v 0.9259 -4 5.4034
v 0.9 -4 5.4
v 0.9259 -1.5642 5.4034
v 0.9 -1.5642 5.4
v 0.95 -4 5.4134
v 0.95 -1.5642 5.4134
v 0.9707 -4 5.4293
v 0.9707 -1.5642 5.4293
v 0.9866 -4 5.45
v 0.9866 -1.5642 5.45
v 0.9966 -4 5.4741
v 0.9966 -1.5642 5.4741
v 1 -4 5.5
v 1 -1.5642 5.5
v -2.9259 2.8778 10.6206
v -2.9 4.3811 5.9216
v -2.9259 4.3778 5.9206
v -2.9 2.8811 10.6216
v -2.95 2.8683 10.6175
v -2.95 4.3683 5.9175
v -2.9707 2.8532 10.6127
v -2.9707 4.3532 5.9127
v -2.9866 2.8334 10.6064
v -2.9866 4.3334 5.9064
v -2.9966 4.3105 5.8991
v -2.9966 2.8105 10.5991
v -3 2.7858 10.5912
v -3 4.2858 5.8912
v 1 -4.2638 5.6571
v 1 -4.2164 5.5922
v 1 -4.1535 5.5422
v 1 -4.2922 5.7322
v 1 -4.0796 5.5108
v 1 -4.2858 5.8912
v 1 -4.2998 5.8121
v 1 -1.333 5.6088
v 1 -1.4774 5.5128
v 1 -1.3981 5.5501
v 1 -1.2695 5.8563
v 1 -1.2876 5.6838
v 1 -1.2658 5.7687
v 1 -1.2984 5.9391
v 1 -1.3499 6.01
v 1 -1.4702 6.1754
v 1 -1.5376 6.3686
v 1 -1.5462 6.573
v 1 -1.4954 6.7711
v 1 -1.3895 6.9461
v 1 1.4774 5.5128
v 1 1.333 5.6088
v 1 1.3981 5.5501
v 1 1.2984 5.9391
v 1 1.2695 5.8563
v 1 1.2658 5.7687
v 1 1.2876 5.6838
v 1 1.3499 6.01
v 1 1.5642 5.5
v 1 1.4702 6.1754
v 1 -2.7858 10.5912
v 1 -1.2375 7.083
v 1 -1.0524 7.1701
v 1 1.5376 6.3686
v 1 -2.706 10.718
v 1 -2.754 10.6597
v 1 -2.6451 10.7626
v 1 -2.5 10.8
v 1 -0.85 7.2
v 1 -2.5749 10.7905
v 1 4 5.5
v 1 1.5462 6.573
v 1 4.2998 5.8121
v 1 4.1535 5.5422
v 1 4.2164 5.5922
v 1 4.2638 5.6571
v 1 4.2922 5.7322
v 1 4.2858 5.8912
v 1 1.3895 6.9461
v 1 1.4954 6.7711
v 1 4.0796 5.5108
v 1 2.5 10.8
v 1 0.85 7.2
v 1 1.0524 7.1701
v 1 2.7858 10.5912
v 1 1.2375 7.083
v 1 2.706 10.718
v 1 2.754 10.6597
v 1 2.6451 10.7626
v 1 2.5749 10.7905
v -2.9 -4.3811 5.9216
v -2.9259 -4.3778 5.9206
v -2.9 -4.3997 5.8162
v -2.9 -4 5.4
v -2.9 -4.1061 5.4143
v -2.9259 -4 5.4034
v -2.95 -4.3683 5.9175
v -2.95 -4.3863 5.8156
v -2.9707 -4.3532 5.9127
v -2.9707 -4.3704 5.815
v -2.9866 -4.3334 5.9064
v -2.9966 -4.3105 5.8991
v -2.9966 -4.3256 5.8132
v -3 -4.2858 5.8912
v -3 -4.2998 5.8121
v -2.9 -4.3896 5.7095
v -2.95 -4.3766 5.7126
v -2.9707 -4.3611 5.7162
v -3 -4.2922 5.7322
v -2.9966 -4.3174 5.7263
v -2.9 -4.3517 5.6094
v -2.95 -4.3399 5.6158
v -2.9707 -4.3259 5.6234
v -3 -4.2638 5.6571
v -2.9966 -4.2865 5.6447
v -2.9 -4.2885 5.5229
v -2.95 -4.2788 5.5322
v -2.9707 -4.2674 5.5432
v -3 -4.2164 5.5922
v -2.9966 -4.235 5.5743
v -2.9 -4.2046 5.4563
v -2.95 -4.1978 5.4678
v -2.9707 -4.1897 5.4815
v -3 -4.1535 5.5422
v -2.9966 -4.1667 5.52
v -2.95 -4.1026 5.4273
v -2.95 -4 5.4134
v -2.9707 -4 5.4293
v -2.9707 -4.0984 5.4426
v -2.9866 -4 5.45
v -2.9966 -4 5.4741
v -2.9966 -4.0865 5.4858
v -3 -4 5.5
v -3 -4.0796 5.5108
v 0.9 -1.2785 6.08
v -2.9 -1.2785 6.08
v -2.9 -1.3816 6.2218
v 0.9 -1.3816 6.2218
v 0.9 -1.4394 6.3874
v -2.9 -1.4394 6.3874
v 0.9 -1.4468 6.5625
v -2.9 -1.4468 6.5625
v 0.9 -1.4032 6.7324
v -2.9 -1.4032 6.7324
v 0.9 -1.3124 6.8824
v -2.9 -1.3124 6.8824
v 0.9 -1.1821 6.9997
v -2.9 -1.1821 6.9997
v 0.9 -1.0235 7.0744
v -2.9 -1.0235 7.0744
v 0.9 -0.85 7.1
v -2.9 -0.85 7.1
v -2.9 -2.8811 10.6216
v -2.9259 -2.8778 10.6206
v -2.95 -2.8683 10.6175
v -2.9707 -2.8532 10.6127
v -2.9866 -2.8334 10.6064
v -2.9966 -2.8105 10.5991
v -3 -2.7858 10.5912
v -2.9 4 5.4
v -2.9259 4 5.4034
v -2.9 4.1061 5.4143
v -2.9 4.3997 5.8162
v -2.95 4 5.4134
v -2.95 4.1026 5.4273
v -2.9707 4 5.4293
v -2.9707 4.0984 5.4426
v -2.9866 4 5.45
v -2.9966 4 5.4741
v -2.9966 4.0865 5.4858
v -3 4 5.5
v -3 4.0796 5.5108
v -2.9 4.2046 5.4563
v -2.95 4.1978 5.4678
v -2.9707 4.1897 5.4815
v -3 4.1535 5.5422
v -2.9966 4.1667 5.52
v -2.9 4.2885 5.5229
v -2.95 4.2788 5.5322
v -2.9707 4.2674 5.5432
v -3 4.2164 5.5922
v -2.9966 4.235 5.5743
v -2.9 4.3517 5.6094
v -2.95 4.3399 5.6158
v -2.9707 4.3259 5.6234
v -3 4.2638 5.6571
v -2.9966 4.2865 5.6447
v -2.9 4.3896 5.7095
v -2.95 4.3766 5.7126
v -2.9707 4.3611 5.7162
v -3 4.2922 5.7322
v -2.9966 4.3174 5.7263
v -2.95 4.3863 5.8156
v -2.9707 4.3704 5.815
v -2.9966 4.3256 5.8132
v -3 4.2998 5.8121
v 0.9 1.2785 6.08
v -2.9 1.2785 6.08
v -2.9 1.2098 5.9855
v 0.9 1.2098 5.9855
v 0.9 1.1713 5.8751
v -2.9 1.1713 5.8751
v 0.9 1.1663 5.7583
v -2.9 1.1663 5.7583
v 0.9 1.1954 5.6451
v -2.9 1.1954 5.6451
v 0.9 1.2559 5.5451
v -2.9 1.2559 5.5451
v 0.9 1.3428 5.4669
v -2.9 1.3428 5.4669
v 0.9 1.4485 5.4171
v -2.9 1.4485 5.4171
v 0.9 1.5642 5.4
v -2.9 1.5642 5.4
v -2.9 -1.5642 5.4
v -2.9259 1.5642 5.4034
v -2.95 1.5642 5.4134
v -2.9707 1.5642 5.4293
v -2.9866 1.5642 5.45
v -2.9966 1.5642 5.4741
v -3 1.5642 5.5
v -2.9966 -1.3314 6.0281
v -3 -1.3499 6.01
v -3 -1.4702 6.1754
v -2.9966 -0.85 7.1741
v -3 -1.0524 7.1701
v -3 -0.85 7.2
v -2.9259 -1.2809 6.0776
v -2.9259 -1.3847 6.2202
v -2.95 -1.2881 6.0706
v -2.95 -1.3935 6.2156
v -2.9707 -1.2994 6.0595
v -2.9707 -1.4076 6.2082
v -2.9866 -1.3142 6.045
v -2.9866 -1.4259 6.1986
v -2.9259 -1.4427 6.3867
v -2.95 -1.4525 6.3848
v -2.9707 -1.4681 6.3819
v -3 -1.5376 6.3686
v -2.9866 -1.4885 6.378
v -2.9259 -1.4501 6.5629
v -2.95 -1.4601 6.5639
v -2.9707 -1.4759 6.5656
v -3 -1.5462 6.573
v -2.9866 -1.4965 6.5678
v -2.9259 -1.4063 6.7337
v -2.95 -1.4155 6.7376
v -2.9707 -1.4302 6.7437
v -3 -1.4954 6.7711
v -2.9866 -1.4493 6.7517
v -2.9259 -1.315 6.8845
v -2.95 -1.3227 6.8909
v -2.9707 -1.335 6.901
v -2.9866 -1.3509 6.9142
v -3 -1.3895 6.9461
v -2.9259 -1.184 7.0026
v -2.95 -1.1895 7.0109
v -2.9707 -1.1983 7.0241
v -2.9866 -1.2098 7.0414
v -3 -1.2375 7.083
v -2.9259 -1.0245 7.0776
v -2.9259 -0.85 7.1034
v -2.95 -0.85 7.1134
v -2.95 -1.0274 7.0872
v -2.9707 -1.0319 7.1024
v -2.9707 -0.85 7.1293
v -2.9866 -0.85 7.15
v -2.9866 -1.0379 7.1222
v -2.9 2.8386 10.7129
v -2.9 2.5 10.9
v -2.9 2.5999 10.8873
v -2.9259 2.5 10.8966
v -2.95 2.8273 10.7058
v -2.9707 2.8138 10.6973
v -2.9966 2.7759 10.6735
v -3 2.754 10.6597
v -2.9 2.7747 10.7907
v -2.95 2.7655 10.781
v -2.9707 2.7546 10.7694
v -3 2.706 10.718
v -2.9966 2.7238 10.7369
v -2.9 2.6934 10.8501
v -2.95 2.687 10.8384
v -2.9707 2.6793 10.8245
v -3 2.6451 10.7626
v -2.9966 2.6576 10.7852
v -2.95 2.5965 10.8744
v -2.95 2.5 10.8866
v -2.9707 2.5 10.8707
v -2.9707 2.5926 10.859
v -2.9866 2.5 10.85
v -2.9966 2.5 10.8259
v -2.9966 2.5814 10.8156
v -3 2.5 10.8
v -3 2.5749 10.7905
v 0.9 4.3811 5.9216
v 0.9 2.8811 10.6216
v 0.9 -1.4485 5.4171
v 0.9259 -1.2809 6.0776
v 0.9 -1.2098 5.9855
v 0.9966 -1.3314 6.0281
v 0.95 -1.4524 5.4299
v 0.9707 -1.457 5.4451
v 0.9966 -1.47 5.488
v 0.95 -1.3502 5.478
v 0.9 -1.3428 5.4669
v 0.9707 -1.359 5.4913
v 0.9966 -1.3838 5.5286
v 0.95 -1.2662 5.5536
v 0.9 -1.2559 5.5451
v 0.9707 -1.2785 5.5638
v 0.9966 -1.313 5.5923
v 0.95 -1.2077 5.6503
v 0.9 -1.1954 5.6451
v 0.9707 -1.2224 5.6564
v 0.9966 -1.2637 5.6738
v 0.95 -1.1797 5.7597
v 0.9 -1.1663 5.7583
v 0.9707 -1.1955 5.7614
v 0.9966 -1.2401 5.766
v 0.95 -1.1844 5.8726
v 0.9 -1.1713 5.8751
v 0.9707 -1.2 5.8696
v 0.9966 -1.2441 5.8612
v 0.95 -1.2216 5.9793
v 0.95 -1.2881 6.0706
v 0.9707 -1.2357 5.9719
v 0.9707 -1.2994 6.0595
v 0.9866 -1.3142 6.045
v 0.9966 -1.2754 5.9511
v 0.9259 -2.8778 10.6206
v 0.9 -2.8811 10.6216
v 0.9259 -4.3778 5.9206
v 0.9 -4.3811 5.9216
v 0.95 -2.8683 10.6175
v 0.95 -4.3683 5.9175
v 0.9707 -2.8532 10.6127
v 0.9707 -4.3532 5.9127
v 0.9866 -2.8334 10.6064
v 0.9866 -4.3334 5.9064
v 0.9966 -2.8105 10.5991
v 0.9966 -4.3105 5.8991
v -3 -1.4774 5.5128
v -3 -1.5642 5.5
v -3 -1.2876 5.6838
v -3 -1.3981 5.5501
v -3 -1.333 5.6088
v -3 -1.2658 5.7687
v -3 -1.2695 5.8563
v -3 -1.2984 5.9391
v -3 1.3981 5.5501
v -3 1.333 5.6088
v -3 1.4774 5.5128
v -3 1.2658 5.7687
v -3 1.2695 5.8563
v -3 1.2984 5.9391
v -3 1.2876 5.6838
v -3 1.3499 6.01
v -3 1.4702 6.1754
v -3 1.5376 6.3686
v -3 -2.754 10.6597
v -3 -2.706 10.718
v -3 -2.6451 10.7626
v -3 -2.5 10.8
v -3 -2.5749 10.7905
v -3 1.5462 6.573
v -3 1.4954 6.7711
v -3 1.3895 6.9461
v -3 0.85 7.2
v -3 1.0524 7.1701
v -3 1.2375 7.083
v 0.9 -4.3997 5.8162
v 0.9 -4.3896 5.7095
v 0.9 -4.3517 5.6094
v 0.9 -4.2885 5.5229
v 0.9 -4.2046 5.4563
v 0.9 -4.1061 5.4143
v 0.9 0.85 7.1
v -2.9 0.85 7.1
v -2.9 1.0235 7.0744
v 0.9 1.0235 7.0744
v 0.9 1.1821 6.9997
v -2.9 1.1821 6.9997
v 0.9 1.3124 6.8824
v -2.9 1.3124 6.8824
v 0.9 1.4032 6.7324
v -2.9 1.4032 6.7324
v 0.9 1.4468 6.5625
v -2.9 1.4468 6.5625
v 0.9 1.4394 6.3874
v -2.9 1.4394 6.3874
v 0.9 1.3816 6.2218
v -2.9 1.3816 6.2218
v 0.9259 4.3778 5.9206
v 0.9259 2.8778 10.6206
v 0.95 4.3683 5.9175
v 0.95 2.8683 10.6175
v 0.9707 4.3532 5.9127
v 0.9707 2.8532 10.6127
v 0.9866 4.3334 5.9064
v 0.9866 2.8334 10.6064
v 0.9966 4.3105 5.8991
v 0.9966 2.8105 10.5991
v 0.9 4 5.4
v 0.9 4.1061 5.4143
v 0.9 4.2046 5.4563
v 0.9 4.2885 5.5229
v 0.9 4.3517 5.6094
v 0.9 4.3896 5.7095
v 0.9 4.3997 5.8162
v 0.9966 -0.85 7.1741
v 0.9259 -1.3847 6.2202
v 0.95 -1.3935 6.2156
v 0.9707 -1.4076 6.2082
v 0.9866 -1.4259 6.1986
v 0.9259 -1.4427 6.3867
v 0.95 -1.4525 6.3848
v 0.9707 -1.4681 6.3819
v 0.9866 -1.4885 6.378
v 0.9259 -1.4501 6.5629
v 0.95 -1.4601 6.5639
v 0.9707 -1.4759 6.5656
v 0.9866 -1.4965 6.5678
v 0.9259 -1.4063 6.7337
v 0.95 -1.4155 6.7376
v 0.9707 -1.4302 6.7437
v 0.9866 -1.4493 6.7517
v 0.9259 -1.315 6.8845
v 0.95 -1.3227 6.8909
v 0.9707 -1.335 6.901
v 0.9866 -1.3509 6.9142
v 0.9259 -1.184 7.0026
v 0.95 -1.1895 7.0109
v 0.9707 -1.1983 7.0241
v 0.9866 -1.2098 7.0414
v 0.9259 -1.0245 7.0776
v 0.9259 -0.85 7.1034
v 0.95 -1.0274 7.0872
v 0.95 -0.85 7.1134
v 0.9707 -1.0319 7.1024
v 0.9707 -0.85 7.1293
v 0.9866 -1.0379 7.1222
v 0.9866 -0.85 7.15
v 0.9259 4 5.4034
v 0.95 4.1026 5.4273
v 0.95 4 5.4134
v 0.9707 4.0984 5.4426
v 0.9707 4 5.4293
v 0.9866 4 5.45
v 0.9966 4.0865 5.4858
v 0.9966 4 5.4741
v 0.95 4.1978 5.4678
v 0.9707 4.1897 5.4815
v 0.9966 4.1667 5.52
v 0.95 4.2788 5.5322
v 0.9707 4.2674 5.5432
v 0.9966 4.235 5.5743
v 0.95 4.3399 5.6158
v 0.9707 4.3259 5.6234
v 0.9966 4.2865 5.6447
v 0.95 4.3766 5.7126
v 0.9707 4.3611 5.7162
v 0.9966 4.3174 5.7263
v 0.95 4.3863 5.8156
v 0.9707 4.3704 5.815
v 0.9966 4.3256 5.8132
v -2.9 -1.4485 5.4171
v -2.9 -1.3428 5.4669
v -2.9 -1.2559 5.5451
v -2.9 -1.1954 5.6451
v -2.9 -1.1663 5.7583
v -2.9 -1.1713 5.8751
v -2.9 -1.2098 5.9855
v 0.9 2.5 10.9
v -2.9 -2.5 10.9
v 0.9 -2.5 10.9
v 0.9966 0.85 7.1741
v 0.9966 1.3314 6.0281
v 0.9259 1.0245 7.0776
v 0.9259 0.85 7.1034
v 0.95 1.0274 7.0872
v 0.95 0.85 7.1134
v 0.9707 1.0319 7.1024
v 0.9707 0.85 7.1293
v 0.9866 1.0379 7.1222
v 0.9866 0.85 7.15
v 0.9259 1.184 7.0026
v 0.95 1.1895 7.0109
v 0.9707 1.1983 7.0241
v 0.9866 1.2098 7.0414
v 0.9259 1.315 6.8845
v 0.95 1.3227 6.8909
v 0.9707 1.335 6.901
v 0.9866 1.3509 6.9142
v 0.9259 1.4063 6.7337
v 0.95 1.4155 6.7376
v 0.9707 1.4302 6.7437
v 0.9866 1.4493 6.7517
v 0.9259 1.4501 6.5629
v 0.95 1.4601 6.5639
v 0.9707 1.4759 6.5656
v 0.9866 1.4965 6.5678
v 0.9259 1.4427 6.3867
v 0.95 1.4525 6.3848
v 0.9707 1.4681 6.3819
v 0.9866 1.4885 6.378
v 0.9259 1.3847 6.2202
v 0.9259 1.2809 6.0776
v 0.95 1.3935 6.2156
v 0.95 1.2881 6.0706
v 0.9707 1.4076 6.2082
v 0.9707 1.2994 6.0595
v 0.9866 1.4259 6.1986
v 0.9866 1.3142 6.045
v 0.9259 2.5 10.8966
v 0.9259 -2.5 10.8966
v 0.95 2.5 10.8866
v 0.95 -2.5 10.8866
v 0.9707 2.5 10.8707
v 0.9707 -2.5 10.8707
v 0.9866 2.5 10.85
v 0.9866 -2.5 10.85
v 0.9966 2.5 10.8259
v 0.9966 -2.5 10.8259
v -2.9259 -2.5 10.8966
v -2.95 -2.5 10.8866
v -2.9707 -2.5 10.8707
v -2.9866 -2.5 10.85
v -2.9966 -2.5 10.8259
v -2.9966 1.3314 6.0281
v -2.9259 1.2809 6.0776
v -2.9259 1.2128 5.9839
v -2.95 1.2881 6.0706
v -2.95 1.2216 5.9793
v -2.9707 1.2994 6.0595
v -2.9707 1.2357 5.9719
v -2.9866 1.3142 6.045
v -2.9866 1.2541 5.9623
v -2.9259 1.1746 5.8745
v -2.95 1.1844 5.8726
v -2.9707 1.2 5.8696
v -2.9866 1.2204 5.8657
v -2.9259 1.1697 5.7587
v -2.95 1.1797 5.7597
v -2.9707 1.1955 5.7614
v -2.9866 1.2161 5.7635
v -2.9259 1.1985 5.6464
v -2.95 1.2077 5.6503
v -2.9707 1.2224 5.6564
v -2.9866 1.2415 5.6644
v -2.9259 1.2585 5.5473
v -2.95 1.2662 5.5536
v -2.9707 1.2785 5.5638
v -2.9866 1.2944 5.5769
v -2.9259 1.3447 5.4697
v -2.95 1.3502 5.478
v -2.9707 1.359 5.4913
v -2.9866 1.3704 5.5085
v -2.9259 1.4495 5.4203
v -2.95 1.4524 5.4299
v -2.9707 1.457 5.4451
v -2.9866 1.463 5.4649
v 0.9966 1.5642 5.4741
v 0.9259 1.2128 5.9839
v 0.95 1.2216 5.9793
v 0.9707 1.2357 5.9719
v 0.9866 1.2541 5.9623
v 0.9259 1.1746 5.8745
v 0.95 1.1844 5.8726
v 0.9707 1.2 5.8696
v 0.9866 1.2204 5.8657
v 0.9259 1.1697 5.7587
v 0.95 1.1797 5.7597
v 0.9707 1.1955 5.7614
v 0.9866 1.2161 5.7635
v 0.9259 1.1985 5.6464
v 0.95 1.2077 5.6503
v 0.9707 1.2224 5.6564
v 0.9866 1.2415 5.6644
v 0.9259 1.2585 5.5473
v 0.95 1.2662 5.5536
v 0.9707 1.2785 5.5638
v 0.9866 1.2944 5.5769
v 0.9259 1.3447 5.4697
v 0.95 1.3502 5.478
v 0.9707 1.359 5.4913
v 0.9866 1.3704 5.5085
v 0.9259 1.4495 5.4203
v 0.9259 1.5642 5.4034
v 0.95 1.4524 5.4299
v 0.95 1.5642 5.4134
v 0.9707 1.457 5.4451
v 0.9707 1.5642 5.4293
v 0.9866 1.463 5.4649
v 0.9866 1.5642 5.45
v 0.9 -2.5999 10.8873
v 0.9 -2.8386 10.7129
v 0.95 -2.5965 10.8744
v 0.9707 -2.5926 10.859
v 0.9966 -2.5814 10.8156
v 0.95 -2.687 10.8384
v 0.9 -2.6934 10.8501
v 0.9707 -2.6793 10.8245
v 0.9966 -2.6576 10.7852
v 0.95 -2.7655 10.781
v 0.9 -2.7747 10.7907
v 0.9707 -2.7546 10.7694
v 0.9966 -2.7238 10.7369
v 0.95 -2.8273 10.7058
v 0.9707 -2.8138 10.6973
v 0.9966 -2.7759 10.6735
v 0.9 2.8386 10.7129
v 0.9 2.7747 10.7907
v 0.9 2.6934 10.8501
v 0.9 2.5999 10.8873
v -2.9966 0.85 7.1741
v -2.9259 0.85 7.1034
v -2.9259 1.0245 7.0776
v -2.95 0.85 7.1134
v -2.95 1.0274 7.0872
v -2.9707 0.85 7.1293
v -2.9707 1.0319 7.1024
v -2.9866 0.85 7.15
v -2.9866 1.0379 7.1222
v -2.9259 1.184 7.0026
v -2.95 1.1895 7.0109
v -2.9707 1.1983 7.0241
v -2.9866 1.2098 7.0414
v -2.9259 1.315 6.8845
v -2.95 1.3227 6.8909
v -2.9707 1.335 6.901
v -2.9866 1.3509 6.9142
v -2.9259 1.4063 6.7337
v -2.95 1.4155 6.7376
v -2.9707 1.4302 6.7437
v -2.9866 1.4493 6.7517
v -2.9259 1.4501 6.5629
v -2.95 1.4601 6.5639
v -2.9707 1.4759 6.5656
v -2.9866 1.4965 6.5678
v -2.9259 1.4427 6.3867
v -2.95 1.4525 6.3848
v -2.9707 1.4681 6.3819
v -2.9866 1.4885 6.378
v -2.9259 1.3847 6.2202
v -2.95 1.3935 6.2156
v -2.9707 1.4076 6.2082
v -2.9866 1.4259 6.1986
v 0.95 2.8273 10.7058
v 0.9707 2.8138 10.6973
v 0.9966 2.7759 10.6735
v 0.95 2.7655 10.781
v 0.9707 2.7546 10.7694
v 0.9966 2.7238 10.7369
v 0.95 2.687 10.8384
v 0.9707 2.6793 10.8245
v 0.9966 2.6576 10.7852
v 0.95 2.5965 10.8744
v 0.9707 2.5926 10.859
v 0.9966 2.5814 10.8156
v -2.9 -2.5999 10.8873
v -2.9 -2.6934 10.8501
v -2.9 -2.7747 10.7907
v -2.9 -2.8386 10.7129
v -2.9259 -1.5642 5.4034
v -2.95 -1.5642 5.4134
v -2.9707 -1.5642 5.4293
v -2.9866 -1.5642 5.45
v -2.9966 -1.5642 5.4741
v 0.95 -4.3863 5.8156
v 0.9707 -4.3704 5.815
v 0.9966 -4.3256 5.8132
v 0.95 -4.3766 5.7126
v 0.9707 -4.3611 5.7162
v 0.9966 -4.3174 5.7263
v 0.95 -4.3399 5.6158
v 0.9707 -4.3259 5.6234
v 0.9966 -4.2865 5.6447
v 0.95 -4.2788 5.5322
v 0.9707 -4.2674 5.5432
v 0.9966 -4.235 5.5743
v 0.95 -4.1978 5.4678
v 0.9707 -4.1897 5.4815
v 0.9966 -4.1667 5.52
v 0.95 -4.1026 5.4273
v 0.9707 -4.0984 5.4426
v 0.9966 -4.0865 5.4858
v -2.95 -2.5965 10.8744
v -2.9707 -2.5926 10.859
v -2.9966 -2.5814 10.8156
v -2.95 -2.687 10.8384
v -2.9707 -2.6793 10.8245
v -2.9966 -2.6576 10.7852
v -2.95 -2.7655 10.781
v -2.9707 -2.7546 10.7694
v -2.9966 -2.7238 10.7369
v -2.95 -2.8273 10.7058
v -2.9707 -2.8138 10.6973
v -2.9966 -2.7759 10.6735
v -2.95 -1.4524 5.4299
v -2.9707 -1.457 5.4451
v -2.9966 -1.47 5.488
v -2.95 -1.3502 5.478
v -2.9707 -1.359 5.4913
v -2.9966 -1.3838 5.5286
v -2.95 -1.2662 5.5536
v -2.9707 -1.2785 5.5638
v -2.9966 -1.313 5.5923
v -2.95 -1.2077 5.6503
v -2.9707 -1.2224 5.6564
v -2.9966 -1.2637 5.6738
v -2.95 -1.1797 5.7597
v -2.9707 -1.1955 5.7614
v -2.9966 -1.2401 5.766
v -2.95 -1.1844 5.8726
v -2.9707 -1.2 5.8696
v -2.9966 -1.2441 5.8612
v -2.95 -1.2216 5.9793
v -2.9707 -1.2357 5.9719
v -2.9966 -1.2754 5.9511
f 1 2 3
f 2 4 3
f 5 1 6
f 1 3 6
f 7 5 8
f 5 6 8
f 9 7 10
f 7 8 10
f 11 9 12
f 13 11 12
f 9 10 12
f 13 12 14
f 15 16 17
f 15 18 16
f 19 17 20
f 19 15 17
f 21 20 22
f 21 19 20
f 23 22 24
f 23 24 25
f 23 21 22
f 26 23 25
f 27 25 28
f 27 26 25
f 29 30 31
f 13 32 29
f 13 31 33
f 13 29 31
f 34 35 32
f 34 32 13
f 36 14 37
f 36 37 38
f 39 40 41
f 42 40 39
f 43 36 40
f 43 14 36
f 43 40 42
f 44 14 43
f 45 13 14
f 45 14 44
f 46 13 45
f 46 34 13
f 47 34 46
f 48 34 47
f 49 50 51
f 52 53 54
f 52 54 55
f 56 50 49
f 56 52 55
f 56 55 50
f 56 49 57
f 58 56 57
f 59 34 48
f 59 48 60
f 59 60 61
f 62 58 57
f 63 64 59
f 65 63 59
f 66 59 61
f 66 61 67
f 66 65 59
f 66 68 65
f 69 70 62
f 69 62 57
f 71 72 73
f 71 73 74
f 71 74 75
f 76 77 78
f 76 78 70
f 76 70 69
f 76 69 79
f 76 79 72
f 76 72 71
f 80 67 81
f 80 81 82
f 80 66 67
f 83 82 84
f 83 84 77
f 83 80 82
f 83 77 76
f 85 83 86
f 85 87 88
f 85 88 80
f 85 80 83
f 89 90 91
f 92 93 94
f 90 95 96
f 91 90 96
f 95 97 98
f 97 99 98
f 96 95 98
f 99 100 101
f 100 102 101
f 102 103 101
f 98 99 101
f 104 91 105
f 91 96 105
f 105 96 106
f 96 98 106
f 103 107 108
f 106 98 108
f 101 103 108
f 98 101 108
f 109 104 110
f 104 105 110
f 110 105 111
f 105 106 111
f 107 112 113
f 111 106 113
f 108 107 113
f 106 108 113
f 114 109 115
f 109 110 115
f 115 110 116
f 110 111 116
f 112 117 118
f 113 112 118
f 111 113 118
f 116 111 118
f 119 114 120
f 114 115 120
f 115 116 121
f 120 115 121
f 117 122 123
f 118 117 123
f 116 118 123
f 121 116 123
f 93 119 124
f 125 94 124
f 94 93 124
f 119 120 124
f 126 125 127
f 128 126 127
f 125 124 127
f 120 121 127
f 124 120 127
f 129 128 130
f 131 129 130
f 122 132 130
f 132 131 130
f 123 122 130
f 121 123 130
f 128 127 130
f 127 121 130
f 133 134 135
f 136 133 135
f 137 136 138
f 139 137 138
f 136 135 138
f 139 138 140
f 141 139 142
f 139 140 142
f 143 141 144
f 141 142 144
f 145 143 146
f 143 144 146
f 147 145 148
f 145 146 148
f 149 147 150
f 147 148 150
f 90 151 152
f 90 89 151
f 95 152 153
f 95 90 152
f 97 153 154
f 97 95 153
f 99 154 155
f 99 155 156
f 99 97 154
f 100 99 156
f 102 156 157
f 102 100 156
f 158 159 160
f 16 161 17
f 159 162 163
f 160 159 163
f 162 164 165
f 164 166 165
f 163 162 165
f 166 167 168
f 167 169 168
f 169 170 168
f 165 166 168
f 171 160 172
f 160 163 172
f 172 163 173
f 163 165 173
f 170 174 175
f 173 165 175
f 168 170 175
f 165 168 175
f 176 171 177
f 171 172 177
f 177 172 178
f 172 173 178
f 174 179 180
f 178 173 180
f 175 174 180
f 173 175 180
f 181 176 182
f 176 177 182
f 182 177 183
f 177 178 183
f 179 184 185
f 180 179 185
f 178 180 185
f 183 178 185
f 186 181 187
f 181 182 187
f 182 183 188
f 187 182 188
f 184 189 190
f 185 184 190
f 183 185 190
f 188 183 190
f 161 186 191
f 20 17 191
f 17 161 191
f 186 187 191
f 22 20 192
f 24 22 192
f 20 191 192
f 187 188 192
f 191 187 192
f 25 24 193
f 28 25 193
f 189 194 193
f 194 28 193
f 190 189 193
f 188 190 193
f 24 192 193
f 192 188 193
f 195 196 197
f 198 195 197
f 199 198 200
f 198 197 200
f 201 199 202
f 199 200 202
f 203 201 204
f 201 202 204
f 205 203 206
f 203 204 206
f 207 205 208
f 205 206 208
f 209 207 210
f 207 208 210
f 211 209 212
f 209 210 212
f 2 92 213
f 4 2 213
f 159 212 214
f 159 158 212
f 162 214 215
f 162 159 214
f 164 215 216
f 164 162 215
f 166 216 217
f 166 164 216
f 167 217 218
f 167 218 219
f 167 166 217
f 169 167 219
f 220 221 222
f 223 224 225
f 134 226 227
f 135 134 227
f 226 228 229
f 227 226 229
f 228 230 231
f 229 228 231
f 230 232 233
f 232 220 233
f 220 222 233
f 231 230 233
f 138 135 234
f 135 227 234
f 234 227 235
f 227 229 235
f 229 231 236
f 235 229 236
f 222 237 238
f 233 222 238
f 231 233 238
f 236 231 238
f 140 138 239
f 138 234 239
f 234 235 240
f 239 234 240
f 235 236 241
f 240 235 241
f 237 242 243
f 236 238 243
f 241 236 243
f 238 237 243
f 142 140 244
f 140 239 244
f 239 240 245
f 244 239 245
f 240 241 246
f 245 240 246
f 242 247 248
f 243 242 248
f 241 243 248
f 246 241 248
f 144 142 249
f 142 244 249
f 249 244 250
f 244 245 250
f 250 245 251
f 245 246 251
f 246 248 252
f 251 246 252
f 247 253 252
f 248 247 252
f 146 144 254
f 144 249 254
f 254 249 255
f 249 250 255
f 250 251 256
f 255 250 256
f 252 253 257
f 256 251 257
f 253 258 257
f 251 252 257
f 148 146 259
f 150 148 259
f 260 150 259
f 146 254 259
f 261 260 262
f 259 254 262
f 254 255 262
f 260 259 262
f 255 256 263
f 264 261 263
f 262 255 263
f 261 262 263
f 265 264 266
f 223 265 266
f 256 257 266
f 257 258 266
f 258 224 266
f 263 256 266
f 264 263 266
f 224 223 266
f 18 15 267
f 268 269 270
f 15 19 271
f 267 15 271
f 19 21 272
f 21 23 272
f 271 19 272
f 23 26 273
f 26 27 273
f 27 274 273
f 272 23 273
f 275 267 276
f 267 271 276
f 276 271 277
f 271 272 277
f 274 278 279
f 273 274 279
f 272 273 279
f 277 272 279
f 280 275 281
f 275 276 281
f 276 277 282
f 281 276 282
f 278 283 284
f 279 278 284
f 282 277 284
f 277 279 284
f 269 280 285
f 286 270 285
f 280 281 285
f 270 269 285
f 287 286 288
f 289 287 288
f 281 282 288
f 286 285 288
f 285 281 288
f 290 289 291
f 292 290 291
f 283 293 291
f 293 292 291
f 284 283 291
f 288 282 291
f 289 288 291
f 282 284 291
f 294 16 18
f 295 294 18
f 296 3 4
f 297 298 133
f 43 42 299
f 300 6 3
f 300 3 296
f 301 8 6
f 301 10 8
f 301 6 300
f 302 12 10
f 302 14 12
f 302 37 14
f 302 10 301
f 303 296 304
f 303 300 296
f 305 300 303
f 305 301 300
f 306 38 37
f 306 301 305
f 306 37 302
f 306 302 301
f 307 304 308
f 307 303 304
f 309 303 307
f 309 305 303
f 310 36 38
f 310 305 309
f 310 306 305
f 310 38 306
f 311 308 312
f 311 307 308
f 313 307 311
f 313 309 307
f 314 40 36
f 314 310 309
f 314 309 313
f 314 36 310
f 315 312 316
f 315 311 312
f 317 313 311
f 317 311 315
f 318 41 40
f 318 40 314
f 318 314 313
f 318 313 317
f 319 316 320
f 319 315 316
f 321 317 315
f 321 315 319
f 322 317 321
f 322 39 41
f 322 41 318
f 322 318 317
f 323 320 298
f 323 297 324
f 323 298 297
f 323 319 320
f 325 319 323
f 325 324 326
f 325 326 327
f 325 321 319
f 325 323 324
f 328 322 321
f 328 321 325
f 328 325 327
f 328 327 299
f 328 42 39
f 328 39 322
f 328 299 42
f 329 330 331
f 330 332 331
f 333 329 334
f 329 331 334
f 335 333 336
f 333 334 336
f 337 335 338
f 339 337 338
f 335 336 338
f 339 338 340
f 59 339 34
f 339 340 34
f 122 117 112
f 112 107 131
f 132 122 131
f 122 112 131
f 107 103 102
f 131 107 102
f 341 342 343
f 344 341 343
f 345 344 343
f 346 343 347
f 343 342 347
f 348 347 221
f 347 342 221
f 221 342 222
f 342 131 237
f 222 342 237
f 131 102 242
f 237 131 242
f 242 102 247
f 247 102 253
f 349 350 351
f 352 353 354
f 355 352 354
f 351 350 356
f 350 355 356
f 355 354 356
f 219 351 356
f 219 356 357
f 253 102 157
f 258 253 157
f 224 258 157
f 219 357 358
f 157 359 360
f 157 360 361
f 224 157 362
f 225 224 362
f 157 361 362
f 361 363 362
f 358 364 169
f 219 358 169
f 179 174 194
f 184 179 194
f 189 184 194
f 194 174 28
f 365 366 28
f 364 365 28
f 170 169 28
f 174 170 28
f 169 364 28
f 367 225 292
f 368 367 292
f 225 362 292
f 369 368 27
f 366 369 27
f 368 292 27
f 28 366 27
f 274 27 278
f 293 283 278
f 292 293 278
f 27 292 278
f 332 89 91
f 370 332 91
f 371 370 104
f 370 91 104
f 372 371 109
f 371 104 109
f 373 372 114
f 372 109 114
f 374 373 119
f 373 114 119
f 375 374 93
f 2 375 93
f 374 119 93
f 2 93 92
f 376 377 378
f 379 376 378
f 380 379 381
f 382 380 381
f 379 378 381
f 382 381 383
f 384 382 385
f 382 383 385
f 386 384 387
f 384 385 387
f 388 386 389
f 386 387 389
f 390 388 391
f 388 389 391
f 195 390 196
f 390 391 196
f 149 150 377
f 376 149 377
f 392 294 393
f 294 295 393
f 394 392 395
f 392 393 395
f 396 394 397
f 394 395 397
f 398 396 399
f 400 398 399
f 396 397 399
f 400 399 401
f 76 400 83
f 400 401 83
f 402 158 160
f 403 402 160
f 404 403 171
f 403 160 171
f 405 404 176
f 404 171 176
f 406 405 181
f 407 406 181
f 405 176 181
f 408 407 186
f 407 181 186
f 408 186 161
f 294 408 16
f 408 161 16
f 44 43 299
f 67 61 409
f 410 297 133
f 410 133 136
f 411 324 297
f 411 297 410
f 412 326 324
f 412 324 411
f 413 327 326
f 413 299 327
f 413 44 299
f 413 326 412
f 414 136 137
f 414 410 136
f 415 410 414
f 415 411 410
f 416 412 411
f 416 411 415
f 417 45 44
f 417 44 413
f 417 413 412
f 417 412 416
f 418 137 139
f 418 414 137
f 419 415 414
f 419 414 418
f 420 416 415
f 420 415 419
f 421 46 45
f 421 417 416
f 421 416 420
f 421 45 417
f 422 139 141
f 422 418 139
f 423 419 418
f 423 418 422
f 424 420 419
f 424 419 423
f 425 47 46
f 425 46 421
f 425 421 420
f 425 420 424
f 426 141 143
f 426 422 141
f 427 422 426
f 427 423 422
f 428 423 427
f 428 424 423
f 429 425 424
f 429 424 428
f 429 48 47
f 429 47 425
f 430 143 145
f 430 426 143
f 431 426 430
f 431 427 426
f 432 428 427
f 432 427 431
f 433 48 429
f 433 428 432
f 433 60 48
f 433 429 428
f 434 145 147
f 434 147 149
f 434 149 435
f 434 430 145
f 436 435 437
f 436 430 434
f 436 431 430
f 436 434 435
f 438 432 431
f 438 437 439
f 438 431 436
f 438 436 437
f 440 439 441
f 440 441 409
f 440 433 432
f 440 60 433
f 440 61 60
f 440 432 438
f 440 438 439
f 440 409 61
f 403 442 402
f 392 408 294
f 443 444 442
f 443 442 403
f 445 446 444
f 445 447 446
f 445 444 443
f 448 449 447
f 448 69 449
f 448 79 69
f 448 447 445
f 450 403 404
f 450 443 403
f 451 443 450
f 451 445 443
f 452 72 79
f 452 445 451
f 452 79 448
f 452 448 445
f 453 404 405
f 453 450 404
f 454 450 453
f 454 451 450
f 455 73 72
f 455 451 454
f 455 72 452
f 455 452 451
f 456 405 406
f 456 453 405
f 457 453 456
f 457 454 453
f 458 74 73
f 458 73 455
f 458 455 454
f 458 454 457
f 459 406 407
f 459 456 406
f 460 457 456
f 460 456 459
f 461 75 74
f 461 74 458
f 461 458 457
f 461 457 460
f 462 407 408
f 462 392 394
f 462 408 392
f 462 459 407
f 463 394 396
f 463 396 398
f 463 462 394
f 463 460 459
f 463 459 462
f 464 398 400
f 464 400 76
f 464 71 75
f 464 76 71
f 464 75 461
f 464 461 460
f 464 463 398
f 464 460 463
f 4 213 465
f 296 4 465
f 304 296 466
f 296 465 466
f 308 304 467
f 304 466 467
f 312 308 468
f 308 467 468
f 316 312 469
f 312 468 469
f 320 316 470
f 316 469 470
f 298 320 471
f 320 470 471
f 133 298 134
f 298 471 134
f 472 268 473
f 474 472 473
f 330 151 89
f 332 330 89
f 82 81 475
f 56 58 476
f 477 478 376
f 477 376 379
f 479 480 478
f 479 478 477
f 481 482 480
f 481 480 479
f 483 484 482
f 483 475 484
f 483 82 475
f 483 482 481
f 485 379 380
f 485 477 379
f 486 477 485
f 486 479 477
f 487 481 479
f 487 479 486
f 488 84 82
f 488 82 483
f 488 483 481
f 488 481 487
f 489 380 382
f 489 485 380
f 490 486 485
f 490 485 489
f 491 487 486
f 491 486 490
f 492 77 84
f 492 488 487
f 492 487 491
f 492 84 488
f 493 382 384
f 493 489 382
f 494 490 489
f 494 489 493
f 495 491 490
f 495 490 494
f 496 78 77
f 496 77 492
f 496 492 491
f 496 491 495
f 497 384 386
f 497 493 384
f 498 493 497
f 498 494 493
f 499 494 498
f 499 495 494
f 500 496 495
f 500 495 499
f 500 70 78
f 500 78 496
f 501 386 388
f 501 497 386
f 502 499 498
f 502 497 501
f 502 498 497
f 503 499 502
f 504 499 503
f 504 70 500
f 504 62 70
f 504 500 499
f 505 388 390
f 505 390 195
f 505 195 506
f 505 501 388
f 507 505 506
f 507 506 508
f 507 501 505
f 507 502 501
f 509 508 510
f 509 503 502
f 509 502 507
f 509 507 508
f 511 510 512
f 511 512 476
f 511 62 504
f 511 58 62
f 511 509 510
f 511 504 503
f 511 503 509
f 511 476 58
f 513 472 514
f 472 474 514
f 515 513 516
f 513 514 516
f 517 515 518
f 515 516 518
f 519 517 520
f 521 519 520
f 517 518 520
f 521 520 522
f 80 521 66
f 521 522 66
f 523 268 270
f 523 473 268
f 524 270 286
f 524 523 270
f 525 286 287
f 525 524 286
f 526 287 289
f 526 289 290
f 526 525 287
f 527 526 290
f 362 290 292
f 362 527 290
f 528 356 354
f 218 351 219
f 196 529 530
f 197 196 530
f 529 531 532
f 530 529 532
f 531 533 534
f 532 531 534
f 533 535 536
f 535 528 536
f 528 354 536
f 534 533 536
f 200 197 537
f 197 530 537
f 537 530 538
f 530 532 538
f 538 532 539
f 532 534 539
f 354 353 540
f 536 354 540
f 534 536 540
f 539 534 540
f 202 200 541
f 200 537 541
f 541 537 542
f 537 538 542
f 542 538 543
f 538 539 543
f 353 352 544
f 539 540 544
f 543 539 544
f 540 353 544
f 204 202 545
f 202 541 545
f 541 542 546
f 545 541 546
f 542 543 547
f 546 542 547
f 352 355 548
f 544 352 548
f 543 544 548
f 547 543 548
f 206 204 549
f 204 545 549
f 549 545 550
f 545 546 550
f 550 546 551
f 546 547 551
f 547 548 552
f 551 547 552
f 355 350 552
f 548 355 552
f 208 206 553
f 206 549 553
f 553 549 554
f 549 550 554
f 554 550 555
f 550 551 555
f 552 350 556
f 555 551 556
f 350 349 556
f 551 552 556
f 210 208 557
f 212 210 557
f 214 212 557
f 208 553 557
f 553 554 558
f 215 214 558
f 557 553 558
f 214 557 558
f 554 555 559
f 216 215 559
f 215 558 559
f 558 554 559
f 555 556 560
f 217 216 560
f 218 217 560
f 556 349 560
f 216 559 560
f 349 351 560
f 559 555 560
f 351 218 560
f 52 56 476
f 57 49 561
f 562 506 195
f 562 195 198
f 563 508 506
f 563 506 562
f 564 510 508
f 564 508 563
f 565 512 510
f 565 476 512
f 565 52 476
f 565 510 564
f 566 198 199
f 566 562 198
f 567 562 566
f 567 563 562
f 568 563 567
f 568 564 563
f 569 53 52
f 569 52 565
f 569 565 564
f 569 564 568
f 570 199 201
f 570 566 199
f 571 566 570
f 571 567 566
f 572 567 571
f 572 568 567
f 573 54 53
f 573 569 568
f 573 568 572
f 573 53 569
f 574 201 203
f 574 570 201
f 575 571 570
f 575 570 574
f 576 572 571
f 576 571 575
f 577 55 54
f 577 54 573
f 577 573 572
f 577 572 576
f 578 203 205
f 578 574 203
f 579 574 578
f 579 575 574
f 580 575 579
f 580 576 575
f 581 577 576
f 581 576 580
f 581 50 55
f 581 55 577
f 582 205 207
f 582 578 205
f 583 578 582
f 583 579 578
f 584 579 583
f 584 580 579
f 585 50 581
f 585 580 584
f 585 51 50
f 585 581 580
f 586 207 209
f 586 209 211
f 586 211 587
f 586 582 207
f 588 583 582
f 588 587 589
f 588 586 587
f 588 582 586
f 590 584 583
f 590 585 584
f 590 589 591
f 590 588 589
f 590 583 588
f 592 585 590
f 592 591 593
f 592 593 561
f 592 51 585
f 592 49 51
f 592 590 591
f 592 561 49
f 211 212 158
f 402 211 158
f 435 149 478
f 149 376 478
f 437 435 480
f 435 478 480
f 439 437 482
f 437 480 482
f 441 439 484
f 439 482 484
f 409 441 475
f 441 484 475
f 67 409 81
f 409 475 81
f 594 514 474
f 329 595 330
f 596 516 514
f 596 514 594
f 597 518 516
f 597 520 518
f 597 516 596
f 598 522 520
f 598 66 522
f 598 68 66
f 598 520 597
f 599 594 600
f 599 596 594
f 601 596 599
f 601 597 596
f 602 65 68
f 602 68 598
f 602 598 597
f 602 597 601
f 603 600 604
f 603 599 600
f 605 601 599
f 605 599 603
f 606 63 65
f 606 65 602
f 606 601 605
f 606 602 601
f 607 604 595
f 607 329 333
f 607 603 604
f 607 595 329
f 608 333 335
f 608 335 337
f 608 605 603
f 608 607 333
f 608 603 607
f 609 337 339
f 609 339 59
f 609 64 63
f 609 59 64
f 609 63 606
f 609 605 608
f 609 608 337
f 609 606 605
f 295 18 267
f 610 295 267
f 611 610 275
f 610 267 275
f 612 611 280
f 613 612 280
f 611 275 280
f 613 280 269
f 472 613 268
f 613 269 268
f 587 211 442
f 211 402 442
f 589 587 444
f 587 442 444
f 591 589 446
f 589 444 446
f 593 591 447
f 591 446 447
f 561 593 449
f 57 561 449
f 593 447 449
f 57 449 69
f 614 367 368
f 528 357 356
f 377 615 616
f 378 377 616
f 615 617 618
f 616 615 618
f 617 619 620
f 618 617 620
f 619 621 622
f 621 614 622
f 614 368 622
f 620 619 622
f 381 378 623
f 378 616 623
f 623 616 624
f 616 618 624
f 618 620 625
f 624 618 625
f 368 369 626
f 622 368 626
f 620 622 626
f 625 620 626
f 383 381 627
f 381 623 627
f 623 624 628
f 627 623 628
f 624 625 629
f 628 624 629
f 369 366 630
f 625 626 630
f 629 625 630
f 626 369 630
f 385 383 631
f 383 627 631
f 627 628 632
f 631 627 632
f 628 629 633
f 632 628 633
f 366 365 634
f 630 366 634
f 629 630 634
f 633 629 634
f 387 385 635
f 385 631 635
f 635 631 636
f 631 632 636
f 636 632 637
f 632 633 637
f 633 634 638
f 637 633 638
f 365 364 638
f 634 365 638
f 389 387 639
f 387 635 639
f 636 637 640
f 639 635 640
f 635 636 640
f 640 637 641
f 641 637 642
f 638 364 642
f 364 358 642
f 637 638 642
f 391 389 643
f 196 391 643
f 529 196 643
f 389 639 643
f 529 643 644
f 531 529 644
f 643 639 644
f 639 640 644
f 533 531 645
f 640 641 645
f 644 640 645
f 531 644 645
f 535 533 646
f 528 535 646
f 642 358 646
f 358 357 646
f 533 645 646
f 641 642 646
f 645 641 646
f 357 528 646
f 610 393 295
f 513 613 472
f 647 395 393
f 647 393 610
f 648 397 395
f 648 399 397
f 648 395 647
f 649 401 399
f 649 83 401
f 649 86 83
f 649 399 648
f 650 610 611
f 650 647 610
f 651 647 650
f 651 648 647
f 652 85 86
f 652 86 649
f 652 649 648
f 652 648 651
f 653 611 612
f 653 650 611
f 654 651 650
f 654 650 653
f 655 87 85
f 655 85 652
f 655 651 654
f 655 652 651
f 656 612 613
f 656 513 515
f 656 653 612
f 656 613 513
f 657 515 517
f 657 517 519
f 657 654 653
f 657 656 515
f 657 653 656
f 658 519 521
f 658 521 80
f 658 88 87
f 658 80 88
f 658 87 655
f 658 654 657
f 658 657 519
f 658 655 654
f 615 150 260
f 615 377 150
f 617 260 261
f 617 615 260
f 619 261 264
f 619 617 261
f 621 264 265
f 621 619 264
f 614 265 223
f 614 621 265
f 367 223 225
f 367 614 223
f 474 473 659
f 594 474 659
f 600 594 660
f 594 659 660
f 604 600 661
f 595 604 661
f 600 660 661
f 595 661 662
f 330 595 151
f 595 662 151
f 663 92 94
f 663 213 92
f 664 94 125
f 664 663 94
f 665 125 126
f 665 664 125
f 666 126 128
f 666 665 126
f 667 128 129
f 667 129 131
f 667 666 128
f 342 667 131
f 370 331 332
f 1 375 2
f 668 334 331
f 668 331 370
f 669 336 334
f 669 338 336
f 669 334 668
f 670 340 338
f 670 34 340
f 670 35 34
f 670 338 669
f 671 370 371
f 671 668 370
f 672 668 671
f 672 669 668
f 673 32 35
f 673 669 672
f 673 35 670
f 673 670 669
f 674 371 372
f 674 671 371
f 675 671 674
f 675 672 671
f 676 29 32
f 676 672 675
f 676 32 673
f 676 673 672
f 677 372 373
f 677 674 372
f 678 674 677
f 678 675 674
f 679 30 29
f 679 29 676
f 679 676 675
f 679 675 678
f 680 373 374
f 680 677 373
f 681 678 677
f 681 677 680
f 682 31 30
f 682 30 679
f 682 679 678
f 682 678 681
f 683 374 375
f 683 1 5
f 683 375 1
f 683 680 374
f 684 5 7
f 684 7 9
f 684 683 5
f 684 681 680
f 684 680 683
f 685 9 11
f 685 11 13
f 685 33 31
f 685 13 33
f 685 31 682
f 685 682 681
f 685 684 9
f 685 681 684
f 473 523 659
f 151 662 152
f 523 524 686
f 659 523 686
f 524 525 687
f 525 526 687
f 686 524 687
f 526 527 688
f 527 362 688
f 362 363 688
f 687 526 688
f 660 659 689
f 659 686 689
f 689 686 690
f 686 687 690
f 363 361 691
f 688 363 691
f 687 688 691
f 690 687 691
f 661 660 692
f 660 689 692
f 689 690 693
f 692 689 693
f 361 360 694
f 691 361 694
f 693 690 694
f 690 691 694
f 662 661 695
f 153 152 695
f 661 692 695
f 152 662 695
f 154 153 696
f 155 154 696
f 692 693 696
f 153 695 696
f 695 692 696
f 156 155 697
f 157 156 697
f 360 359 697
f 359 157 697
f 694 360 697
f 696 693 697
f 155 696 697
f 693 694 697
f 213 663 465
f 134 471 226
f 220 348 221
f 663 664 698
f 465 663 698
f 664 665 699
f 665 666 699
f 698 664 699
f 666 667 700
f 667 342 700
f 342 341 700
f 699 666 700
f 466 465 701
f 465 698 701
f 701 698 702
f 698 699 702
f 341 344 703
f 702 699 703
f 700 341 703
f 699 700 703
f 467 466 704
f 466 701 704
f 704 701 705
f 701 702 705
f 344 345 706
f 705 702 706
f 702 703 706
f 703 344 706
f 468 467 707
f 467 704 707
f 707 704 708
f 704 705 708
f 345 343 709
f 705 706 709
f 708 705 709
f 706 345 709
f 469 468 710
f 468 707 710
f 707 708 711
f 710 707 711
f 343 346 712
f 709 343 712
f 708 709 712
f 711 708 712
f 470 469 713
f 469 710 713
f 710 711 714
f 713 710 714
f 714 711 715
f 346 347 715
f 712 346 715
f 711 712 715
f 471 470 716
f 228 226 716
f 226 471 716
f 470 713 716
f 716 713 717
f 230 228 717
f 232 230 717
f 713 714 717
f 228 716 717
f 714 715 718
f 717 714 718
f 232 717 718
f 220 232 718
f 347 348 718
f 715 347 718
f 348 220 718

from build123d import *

# Parameters (mm, degrees)
BOSS_EXTRUDE1_DEPTH      = 1
BOSS_EXTRUDE1_DEPTH_BACK = 3
FILLET1_R                = 0.1


with BuildPart() as part:
    # Sketch3 → Boss-Extrude1 (new, two sides: drawn at the far end of the back side and taken through both)
    with BuildSketch(Plane.YZ.offset(-BOSS_EXTRUDE1_DEPTH_BACK)):
        with BuildLine():
            Line((-4, 5.4), (-1.56416825, 5.4))
            ThreePointArc((-1.56416825, 5.4), (-1.195386471, 5.645080666), (-1.278511113, 6.08))
            ThreePointArc((-1.278511113, 6.08), (-1.403198074, 6.732379001), (-0.850025407, 7.1))
            Line((-0.850025407, 7.1), (0.850025407, 7.1))
            ThreePointArc((0.850025407, 7.1), (1.403198074, 6.732379001), (1.278511113, 6.08))
            ThreePointArc((1.278511113, 6.08), (1.195386471, 5.645080666), (1.56416825, 5.4))
            Line((1.56416825, 5.4), (4, 5.4))
            ThreePointArc((4, 5.4), (4.322991043, 5.564040711), (4.381063684, 5.92161607))
            Line((4.381063684, 5.92161607), (2.881063684, 10.62161607))
            ThreePointArc((2.881063684, 10.62161607), (2.735959289, 10.822991043), (2.5, 10.9))
            Line((2.5, 10.9), (-2.5, 10.9))
            ThreePointArc((-2.5, 10.9), (-2.735959289, 10.822991043), (-2.881063684, 10.62161607))
            Line((-2.881063684, 10.62161607), (-4.381063684, 5.92161607))
            ThreePointArc((-4.381063684, 5.92161607), (-4.322991043, 5.564040711), (-4, 5.4))
        make_face()
    extrude(amount=BOSS_EXTRUDE1_DEPTH + BOSS_EXTRUDE1_DEPTH_BACK)

    # Fillet1
    fillet1_edges = [part.edges().sort_by_distance(p)[0] for p in [
        (-3, -1.195386471, 5.645080666),
        (-3, -1.403198074, 6.732379001),
        (-3, 0, 7.1),
        (-3, 1.403198074, 6.732379001),
        (-3, 1.195386471, 5.645080666),
        (-3, 2.782084125, 5.4),
        (-3, 4.322991043, 5.564040711),
        (1, -4.322991043, 5.564040711),
        (1, -2.782084125, 5.4),
        (1, -1.195386471, 5.645080666),
        (1, -1.403198074, 6.732379001),
        (-3, 3.631063684, 8.27161607),
        (1, 0, 7.1),
        (1, 1.403198074, 6.732379001),
        (1, 1.195386471, 5.645080666),
        (1, 2.782084125, 5.4),
        (1, 4.322991043, 5.564040711),
        (1, 3.631063684, 8.27161607),
        (1, 2.735959289, 10.822991043),
        (1, 0, 10.9),
        (1, -2.735959289, 10.822991043),
        (1, -3.631063684, 8.27161607),
        (-3, 2.735959289, 10.822991043),
        (-3, 0, 10.9),
        (-3, -4.322991043, 5.564040711),
        (-3, -2.735959289, 10.822991043),
        (-3, -3.631063684, 8.27161607),
        (-3, -2.782084125, 5.4),
    ]]
    fillet(fillet1_edges, radius=FILLET1_R)


solid = part.part
